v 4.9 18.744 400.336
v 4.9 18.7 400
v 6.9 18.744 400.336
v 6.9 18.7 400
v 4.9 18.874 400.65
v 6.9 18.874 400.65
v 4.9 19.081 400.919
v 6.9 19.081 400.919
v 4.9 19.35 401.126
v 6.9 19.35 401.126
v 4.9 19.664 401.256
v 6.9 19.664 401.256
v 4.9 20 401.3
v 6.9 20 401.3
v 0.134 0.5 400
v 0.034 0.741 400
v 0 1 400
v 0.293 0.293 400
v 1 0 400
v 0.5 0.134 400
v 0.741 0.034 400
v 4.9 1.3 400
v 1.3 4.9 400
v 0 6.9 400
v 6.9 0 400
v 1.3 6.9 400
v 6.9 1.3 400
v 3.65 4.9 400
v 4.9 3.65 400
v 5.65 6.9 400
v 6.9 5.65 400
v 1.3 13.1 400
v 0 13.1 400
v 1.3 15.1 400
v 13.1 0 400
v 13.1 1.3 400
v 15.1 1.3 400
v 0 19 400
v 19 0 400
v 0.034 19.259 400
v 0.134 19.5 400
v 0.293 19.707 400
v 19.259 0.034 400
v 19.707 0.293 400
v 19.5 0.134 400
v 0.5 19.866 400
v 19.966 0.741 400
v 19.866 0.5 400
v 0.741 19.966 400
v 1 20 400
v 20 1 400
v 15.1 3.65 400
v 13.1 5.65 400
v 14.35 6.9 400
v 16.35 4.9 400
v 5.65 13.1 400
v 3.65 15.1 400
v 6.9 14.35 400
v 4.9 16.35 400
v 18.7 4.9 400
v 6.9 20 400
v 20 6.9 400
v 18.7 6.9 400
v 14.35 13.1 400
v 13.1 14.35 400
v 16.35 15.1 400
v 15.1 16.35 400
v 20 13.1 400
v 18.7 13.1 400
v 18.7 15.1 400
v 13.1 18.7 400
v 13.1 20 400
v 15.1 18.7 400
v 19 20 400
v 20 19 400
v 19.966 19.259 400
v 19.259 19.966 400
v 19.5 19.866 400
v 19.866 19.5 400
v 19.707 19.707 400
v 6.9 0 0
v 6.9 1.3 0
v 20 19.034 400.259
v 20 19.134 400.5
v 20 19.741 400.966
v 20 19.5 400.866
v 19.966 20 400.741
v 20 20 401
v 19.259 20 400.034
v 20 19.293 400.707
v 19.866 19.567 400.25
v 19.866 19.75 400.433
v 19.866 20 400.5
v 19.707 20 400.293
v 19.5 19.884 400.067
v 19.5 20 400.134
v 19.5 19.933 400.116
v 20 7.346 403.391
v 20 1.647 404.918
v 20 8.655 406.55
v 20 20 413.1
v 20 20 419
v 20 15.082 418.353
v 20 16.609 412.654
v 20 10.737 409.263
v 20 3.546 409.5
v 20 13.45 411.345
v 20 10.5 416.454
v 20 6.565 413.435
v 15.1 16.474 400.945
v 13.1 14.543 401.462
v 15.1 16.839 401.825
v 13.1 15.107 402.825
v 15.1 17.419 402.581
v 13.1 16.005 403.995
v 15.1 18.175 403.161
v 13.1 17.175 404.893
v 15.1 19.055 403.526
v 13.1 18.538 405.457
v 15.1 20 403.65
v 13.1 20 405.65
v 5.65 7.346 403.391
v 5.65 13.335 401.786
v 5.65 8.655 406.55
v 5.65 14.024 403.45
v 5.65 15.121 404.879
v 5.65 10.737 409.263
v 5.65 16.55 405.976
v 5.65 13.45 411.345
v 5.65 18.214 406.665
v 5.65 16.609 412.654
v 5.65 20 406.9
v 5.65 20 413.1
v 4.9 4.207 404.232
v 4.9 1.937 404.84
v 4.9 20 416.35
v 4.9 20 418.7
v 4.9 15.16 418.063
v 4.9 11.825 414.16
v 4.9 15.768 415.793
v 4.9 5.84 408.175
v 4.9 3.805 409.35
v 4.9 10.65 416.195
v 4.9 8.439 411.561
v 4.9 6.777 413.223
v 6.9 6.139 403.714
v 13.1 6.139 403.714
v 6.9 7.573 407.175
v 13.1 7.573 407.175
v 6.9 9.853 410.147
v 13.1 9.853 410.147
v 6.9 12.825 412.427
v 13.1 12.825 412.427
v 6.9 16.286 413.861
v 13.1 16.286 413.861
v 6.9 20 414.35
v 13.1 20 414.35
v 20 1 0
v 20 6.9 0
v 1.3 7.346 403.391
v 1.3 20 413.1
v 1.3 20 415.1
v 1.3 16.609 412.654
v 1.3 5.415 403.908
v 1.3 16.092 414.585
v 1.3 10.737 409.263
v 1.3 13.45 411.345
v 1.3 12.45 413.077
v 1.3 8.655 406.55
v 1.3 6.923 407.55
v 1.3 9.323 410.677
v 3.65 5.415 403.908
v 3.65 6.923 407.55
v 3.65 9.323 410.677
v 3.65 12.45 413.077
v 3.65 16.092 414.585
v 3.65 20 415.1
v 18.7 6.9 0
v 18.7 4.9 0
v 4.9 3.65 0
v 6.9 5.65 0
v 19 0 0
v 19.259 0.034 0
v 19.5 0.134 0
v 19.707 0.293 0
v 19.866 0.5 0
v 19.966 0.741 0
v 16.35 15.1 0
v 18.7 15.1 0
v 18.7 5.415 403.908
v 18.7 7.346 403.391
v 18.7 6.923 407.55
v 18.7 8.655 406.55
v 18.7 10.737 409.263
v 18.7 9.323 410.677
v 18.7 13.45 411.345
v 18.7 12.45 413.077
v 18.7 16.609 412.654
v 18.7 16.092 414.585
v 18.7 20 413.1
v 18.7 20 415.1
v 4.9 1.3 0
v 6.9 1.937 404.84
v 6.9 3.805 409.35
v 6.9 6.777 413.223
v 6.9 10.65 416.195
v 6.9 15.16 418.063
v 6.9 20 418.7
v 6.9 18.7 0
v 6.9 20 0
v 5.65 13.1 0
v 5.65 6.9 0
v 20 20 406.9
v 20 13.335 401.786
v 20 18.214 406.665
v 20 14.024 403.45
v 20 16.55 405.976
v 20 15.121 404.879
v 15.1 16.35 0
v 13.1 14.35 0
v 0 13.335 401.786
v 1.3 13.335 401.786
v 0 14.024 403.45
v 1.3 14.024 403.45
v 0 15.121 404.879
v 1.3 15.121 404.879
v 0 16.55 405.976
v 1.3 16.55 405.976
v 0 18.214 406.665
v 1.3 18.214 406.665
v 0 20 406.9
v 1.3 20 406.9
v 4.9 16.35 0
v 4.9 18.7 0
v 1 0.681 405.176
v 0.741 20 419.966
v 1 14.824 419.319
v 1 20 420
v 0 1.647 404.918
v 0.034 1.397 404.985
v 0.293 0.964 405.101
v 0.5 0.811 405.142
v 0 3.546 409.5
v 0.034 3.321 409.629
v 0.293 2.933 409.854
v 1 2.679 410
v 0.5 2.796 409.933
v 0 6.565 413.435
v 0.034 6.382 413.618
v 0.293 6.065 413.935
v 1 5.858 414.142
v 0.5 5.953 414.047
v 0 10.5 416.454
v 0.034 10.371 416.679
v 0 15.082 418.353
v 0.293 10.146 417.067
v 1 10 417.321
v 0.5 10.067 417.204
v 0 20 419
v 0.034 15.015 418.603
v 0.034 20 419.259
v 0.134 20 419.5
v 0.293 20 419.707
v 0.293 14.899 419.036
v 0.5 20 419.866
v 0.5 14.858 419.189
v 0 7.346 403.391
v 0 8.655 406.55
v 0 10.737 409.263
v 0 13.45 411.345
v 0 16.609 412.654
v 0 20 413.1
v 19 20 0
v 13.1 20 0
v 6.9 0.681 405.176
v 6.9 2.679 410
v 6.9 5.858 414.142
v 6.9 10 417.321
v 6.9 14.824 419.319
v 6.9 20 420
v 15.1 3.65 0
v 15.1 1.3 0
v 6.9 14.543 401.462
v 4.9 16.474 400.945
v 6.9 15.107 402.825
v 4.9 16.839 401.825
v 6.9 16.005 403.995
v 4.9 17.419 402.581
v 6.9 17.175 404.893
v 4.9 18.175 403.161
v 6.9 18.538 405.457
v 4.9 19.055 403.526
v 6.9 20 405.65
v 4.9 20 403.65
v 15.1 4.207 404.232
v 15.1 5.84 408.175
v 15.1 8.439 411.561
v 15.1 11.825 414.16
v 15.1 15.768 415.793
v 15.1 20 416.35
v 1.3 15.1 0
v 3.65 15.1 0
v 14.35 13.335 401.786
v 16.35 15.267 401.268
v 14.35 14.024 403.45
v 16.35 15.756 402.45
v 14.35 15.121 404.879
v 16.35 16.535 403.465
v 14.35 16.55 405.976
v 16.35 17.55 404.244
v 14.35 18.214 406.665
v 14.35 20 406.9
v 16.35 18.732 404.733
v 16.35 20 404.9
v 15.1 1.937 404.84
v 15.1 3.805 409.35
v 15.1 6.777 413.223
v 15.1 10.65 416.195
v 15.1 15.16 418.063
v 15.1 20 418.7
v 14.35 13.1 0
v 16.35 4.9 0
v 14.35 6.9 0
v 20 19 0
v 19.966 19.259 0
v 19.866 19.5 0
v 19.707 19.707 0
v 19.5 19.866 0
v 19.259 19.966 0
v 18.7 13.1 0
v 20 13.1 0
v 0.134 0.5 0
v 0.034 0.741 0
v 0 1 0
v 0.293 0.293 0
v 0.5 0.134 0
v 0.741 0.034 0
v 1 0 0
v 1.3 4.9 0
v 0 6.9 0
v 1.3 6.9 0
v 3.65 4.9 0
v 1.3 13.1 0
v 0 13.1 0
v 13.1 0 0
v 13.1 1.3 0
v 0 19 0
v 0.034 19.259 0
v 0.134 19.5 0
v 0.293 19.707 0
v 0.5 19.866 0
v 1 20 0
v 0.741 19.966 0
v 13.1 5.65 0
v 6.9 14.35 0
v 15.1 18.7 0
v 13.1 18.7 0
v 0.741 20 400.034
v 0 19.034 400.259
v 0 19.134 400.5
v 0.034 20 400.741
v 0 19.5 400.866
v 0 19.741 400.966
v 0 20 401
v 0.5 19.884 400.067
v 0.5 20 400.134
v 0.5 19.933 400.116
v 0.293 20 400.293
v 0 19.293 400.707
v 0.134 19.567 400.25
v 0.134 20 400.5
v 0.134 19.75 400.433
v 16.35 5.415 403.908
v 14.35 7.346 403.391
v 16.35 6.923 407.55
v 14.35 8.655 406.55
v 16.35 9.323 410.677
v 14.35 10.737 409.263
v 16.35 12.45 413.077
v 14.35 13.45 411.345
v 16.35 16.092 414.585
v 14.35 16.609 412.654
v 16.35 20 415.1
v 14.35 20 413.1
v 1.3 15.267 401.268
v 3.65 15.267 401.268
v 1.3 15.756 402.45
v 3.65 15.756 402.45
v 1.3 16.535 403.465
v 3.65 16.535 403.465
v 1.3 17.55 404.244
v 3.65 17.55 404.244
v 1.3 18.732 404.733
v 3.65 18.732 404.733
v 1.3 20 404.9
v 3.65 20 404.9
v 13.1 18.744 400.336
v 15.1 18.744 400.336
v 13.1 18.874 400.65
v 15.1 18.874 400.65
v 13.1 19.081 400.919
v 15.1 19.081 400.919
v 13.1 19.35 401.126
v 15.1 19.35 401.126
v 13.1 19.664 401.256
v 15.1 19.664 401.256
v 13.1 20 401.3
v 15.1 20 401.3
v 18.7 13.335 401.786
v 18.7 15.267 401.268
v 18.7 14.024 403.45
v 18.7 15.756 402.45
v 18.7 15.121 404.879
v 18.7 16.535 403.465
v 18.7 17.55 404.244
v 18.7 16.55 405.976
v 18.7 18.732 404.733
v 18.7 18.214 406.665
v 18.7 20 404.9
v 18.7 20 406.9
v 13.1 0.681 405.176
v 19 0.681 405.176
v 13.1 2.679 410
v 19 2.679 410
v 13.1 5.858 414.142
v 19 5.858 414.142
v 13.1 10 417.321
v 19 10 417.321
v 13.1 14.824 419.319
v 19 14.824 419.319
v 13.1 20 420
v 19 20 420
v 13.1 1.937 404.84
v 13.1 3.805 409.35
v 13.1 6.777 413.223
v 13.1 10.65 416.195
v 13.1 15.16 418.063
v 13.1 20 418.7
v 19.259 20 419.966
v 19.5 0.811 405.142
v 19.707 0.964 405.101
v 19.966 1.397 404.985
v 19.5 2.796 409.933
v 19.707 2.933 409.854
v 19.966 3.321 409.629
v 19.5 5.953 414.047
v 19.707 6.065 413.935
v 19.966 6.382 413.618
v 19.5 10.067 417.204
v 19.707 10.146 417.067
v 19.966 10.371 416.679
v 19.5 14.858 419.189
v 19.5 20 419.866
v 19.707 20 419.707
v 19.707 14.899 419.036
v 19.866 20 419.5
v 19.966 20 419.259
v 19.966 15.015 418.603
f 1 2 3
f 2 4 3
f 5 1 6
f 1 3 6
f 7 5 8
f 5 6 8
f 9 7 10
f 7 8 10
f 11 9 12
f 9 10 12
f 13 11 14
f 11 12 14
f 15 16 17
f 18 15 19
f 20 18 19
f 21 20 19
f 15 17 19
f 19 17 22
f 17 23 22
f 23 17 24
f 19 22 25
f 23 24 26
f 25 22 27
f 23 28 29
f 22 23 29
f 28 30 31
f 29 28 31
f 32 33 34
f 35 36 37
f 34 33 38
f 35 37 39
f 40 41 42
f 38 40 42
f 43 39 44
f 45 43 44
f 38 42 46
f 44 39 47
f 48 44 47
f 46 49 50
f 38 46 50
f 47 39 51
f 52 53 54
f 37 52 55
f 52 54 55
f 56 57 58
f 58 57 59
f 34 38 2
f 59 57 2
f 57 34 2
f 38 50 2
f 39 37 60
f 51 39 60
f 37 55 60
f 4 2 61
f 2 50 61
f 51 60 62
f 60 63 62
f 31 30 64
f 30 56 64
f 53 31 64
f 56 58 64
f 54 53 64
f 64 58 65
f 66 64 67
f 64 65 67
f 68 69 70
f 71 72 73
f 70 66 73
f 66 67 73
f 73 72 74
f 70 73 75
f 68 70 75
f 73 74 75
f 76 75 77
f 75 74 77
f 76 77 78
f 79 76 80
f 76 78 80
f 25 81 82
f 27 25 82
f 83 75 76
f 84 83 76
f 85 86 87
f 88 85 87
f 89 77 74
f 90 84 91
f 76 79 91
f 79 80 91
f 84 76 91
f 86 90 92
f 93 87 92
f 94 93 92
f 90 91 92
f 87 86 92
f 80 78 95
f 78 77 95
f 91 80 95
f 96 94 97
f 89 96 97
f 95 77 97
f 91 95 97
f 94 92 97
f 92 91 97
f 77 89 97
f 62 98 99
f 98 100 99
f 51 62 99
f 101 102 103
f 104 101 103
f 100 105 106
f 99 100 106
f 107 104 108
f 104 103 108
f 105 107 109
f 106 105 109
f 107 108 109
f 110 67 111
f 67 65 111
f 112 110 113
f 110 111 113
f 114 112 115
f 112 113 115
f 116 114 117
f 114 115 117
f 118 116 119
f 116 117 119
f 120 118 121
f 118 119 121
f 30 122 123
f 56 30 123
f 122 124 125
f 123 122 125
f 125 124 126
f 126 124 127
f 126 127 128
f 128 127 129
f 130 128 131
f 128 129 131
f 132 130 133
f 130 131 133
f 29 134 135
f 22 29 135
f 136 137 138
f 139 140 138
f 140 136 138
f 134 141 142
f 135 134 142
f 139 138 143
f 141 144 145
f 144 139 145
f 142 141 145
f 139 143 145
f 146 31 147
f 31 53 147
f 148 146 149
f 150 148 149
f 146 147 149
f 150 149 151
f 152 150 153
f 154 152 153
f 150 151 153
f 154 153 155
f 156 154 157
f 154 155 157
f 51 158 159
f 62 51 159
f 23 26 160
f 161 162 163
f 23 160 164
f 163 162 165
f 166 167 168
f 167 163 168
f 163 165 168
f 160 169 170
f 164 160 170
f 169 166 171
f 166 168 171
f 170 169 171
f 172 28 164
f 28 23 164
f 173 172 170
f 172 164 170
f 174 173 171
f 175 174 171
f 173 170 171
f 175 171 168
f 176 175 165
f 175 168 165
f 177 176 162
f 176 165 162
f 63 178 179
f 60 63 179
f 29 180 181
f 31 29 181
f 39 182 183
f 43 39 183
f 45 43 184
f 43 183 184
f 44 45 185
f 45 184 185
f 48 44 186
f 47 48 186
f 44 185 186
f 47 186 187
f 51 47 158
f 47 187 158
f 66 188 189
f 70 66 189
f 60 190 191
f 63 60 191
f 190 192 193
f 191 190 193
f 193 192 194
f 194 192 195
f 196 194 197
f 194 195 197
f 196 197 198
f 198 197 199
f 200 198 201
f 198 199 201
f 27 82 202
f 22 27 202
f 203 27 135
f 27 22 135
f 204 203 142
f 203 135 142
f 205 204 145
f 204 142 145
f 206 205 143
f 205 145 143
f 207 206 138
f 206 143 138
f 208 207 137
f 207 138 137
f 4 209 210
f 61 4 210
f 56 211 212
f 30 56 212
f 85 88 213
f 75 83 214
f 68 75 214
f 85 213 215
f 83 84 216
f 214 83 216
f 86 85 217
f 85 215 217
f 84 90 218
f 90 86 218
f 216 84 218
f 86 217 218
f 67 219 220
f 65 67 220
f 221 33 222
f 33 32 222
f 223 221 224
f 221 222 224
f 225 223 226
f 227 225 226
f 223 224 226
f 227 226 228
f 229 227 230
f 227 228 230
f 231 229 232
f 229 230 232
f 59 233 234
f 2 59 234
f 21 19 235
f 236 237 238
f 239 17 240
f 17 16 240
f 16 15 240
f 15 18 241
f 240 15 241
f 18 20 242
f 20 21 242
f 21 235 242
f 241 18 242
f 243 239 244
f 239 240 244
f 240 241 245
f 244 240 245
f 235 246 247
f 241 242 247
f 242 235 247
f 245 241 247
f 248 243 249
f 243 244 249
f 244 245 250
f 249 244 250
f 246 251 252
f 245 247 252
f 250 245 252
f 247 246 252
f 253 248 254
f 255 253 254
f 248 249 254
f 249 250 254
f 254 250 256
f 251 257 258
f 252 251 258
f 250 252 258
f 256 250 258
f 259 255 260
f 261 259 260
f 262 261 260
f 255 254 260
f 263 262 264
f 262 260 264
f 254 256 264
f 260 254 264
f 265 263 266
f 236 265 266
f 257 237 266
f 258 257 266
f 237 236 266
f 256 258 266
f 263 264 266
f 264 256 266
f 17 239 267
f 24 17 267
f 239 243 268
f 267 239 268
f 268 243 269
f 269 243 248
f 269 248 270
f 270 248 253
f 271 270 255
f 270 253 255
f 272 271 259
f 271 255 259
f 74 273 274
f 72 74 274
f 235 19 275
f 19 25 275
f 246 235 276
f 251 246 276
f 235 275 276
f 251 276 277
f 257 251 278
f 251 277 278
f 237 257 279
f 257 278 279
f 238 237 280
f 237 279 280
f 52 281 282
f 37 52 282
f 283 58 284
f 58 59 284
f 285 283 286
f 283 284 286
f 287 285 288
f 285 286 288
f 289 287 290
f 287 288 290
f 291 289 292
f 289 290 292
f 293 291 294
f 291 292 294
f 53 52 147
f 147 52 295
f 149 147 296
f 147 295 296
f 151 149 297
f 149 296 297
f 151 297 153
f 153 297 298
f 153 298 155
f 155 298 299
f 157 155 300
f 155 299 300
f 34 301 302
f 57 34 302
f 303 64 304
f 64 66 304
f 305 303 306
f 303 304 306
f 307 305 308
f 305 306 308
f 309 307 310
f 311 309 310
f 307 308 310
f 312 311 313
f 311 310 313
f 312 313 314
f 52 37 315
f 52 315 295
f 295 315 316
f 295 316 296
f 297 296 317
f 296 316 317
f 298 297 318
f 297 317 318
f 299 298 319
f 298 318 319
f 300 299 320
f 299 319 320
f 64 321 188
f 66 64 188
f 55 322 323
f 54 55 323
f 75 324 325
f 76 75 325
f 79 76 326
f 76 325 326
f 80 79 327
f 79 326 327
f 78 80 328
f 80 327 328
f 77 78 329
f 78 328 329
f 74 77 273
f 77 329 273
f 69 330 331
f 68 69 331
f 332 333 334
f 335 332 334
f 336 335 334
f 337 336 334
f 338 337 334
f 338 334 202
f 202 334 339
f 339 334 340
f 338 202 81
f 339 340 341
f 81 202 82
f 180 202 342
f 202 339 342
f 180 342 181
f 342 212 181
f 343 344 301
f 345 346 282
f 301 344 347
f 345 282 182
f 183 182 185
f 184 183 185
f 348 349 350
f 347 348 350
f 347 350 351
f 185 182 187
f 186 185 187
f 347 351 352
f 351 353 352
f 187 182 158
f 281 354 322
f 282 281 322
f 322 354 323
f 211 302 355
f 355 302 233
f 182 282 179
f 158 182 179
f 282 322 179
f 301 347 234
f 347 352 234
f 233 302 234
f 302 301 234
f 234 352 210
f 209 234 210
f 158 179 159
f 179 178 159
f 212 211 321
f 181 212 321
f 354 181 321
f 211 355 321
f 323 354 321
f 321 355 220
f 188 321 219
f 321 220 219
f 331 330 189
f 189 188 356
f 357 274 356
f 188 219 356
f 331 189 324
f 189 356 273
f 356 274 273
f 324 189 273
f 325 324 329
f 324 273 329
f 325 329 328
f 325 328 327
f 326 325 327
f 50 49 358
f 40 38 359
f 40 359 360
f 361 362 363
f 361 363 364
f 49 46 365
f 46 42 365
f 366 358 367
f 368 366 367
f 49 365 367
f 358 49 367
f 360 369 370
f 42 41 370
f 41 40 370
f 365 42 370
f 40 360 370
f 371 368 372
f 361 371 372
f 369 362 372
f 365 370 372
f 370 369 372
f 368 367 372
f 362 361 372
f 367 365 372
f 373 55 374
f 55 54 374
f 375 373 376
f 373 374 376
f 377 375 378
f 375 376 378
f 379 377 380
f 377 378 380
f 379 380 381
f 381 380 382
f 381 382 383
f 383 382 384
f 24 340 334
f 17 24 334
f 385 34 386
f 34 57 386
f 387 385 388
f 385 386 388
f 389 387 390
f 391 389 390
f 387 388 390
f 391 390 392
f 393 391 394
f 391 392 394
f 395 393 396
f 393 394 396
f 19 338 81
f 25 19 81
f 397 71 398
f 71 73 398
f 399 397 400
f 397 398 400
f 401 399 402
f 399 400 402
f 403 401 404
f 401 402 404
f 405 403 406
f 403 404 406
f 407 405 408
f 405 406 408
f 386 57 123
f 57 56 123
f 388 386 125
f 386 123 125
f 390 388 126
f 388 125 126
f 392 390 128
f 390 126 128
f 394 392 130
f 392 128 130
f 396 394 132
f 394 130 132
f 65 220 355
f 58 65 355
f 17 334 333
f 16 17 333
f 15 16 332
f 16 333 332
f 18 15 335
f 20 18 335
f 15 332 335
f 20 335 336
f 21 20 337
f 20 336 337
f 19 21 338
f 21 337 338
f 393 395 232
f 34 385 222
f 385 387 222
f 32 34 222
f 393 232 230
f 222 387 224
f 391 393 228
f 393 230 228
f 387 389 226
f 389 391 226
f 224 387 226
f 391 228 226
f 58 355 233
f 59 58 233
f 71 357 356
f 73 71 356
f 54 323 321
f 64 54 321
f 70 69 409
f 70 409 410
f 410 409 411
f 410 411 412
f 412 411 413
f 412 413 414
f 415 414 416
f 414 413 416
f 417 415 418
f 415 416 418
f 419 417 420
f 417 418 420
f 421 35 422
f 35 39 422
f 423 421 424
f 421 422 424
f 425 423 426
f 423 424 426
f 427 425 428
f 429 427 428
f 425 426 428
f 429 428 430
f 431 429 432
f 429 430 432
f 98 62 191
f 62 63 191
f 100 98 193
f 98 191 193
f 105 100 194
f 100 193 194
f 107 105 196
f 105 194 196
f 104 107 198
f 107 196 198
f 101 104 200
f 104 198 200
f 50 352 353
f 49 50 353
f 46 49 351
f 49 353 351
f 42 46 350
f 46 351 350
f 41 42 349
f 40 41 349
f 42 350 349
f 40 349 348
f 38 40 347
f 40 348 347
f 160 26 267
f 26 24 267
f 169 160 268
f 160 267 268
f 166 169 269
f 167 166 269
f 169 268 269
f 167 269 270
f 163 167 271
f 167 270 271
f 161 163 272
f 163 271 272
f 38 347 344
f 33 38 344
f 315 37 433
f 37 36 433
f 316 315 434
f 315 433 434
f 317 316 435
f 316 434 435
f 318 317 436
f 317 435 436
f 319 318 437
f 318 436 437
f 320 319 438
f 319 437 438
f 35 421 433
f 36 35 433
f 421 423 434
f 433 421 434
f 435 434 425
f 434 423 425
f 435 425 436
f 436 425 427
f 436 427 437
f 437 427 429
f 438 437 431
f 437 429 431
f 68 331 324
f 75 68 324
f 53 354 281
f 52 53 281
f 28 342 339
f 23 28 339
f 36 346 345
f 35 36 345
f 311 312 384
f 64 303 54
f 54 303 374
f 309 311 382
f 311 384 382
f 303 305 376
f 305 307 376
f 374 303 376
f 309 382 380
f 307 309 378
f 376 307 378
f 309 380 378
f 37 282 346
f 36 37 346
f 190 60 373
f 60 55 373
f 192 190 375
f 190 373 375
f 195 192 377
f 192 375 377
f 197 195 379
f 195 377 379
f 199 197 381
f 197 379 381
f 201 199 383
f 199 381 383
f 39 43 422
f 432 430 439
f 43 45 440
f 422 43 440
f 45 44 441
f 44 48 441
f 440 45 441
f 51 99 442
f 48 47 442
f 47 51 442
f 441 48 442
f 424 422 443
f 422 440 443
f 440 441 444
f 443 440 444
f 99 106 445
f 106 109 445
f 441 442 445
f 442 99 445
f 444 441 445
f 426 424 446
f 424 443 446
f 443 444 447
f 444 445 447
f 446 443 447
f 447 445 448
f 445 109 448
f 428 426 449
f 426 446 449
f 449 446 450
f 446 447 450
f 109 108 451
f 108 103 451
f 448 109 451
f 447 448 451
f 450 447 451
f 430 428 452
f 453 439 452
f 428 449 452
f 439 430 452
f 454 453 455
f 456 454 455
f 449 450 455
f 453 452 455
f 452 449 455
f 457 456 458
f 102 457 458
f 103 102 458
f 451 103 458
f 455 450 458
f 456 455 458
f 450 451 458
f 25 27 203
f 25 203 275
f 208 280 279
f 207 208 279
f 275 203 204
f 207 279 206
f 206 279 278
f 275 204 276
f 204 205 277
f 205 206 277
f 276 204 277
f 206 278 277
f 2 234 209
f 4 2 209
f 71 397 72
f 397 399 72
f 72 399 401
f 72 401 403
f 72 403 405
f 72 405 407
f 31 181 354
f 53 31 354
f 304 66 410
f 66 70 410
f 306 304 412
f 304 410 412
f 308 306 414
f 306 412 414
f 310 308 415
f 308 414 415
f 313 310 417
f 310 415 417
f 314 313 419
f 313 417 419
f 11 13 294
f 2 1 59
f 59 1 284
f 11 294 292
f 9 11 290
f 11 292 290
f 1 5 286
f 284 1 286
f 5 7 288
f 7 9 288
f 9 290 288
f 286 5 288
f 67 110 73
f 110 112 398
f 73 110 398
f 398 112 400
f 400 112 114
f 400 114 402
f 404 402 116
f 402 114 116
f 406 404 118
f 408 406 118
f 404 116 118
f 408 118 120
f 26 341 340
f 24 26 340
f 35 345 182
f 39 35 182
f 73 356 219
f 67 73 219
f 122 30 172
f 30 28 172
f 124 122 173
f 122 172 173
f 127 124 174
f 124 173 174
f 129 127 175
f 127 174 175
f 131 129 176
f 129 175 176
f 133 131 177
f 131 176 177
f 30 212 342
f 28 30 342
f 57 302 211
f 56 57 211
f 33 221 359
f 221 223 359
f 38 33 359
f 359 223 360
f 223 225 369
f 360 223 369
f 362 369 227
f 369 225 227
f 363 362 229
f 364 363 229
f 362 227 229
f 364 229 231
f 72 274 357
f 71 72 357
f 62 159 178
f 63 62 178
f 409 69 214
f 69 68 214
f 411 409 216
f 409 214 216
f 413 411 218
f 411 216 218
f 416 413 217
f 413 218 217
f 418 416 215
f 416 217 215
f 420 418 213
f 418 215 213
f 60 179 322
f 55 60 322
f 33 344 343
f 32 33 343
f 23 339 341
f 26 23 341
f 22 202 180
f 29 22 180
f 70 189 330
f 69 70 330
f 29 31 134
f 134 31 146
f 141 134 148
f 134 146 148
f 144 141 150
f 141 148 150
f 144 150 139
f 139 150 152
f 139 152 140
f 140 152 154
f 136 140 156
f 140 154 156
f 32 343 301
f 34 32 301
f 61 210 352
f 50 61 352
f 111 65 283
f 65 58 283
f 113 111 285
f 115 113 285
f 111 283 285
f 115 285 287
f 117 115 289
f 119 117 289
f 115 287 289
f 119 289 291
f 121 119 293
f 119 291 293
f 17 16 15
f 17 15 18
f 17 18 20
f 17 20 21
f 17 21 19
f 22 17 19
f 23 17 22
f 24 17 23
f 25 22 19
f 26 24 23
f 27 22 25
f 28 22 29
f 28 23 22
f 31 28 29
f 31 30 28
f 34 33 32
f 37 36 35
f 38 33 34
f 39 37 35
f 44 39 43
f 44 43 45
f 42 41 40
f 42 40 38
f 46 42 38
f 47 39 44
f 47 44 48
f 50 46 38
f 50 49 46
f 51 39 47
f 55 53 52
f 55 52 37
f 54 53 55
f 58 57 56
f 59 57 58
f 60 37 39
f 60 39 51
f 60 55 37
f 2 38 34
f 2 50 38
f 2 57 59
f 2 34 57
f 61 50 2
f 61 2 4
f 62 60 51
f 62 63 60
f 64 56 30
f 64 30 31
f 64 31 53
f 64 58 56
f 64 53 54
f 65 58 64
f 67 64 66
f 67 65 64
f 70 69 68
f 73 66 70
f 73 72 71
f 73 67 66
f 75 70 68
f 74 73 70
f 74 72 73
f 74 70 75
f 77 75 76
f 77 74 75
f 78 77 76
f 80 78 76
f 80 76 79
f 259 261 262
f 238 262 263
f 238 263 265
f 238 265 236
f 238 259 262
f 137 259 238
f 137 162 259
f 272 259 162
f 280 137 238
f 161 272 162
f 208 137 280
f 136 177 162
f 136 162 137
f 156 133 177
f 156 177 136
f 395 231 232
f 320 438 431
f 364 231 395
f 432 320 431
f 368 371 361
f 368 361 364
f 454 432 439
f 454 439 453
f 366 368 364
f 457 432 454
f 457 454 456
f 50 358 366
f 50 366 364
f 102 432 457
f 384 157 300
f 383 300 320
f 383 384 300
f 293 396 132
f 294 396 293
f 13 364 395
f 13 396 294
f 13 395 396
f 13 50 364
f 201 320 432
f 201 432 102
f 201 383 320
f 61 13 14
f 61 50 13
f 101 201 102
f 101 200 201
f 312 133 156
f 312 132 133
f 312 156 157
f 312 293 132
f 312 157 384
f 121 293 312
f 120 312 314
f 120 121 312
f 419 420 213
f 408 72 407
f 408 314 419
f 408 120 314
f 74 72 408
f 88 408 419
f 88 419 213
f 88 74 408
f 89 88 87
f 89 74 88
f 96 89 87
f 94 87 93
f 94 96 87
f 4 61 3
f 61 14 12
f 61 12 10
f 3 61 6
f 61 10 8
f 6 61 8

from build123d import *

# Parameters (mm, degrees)
F1_DEPTH = 400
F3_ANGLE = 90


with BuildPart() as f1:
    # F0 (on Top) → F1 (new body)
    with BuildSketch(Plane.XY):
        with BuildLine():
            Line((5.65, 13.1), (5.65, 6.9))
            Line((5.65, 6.9), (3.65, 4.9))
            Line((3.65, 4.9), (1.3, 4.9))
            Line((1.3, 4.9), (1.3, 6.9))
            Line((1.3, 6.9), (0, 6.9))
            Line((0, 6.9), (0, 1))
            ThreePointArc((0, 1), (0.292893, 0.292893), (1, 0))
            Line((1, 0), (6.9, 0))
            Line((6.9, 0), (6.9, 1.3))
            Line((6.9, 1.3), (4.9, 1.3))
            Line((4.9, 1.3), (4.9, 3.65))
            Line((4.9, 3.65), (6.9, 5.65))
            Line((6.9, 5.65), (13.1, 5.65))
            Line((13.1, 5.65), (15.1, 3.65))
            Line((15.1, 3.65), (15.1, 1.3))
            Line((15.1, 1.3), (13.1, 1.3))
            Line((13.1, 1.3), (13.1, 0))
            Line((13.1, 0), (19, 0))
            ThreePointArc((19, 0), (19.707107, 0.292893), (20, 1))
            Line((20, 1), (20, 6.9))
            Line((20, 6.9), (18.7, 6.9))
            Line((18.7, 6.9), (18.7, 4.9))
            Line((18.7, 4.9), (16.35, 4.9))
            Line((16.35, 4.9), (14.35, 6.9))
            Line((14.35, 6.9), (14.35, 13.1))
            Line((14.35, 13.1), (16.35, 15.1))
            Line((16.35, 15.1), (18.7, 15.1))
            Line((18.7, 15.1), (18.7, 13.1))
            Line((18.7, 13.1), (20, 13.1))
            Line((20, 13.1), (20, 19))
            ThreePointArc((20, 19), (19.707107, 19.707107), (19, 20))
            Line((19, 20), (13.1, 20))
            Line((13.1, 20), (13.1, 18.7))
            Line((13.1, 18.7), (15.1, 18.7))
            Line((15.1, 18.7), (15.1, 16.35))
            Line((15.1, 16.35), (13.1, 14.35))
            Line((13.1, 14.35), (6.9, 14.35))
            Line((6.9, 14.35), (4.9, 16.35))
            Line((4.9, 16.35), (4.9, 18.7))
            Line((4.9, 18.7), (6.9, 18.7))
            Line((6.9, 18.7), (6.9, 20))
            Line((6.9, 20), (1, 20))
            ThreePointArc((1, 20), (0.292893, 19.707107), (0, 19))
            Line((0, 19), (0, 13.1))
            Line((0, 13.1), (1.3, 13.1))
            Line((1.3, 13.1), (1.3, 15.1))
            Line((1.3, 15.1), (3.65, 15.1))
            Line((3.65, 15.1), (5.65, 13.1))
        make_face()
    extrude(amount=F1_DEPTH)


with BuildPart() as f3:
    # F2 (on face) → F3 (revolve)
    with BuildSketch(Plane.XY.offset(400)):
        with BuildLine():
            Line((20, 13.1), (20, 19))
            ThreePointArc((20, 19), (19.707107, 19.707107), (19, 20))
            Line((19, 20), (13.1, 20))
            Line((13.1, 20), (13.1, 18.7))
            Line((13.1, 18.7), (15.1, 18.7))
            Line((15.1, 18.7), (15.1, 16.35))
            Line((15.1, 16.35), (13.1, 14.35))
            Line((13.1, 14.35), (6.9, 14.35))
            Line((6.9, 14.35), (4.9, 16.35))
            Line((4.9, 16.35), (4.9, 18.7))
            Line((4.9, 18.7), (6.9, 18.7))
            Line((6.9, 18.7), (6.9, 20))
            Line((6.9, 20), (1, 20))
            ThreePointArc((1, 20), (0.292893, 19.707107), (0, 19))
            Line((0, 19), (0, 13.1))
            Line((0, 13.1), (1.3, 13.1))
            Line((1.3, 13.1), (1.3, 15.1))
            Line((1.3, 15.1), (3.65, 15.1))
            Line((3.65, 15.1), (5.65, 13.1))
            Line((5.65, 13.1), (5.65, 6.9))
            Line((5.65, 6.9), (3.65, 4.9))
            Line((3.65, 4.9), (1.3, 4.9))
            Line((1.3, 4.9), (1.3, 6.9))
            Line((1.3, 6.9), (0, 6.9))
            Line((0, 6.9), (0, 1))
            ThreePointArc((0, 1), (0.292893, 0.292893), (1, 0))
            Line((1, 0), (6.9, 0))
            Line((6.9, 0), (6.9, 1.3))
            Line((6.9, 1.3), (4.9, 1.3))
            Line((4.9, 1.3), (4.9, 3.65))
            Line((4.9, 3.65), (6.9, 5.65))
            Line((6.9, 5.65), (13.1, 5.65))
            Line((13.1, 5.65), (15.1, 3.65))
            Line((15.1, 3.65), (15.1, 1.3))
            Line((15.1, 1.3), (13.1, 1.3))
            Line((13.1, 1.3), (13.1, 0))
            Line((13.1, 0), (19, 0))
            ThreePointArc((19, 0), (19.707107, 0.292893), (20, 1))
            Line((20, 1), (20, 6.9))
            Line((20, 6.9), (18.7, 6.9))
            Line((18.7, 6.9), (18.7, 4.9))
            Line((18.7, 4.9), (16.35, 4.9))
            Line((16.35, 4.9), (14.35, 6.9))
            Line((14.35, 6.9), (14.35, 13.1))
            Line((14.35, 13.1), (16.35, 15.1))
            Line((16.35, 15.1), (18.7, 15.1))
            Line((18.7, 15.1), (18.7, 13.1))
            Line((18.7, 13.1), (20, 13.1))
        make_face()
    revolve(axis=Axis((16.05, 20, 400), (-1, 0, 0)), revolution_arc=F3_ANGLE)


solid = Compound([f1.part, f3.part])
